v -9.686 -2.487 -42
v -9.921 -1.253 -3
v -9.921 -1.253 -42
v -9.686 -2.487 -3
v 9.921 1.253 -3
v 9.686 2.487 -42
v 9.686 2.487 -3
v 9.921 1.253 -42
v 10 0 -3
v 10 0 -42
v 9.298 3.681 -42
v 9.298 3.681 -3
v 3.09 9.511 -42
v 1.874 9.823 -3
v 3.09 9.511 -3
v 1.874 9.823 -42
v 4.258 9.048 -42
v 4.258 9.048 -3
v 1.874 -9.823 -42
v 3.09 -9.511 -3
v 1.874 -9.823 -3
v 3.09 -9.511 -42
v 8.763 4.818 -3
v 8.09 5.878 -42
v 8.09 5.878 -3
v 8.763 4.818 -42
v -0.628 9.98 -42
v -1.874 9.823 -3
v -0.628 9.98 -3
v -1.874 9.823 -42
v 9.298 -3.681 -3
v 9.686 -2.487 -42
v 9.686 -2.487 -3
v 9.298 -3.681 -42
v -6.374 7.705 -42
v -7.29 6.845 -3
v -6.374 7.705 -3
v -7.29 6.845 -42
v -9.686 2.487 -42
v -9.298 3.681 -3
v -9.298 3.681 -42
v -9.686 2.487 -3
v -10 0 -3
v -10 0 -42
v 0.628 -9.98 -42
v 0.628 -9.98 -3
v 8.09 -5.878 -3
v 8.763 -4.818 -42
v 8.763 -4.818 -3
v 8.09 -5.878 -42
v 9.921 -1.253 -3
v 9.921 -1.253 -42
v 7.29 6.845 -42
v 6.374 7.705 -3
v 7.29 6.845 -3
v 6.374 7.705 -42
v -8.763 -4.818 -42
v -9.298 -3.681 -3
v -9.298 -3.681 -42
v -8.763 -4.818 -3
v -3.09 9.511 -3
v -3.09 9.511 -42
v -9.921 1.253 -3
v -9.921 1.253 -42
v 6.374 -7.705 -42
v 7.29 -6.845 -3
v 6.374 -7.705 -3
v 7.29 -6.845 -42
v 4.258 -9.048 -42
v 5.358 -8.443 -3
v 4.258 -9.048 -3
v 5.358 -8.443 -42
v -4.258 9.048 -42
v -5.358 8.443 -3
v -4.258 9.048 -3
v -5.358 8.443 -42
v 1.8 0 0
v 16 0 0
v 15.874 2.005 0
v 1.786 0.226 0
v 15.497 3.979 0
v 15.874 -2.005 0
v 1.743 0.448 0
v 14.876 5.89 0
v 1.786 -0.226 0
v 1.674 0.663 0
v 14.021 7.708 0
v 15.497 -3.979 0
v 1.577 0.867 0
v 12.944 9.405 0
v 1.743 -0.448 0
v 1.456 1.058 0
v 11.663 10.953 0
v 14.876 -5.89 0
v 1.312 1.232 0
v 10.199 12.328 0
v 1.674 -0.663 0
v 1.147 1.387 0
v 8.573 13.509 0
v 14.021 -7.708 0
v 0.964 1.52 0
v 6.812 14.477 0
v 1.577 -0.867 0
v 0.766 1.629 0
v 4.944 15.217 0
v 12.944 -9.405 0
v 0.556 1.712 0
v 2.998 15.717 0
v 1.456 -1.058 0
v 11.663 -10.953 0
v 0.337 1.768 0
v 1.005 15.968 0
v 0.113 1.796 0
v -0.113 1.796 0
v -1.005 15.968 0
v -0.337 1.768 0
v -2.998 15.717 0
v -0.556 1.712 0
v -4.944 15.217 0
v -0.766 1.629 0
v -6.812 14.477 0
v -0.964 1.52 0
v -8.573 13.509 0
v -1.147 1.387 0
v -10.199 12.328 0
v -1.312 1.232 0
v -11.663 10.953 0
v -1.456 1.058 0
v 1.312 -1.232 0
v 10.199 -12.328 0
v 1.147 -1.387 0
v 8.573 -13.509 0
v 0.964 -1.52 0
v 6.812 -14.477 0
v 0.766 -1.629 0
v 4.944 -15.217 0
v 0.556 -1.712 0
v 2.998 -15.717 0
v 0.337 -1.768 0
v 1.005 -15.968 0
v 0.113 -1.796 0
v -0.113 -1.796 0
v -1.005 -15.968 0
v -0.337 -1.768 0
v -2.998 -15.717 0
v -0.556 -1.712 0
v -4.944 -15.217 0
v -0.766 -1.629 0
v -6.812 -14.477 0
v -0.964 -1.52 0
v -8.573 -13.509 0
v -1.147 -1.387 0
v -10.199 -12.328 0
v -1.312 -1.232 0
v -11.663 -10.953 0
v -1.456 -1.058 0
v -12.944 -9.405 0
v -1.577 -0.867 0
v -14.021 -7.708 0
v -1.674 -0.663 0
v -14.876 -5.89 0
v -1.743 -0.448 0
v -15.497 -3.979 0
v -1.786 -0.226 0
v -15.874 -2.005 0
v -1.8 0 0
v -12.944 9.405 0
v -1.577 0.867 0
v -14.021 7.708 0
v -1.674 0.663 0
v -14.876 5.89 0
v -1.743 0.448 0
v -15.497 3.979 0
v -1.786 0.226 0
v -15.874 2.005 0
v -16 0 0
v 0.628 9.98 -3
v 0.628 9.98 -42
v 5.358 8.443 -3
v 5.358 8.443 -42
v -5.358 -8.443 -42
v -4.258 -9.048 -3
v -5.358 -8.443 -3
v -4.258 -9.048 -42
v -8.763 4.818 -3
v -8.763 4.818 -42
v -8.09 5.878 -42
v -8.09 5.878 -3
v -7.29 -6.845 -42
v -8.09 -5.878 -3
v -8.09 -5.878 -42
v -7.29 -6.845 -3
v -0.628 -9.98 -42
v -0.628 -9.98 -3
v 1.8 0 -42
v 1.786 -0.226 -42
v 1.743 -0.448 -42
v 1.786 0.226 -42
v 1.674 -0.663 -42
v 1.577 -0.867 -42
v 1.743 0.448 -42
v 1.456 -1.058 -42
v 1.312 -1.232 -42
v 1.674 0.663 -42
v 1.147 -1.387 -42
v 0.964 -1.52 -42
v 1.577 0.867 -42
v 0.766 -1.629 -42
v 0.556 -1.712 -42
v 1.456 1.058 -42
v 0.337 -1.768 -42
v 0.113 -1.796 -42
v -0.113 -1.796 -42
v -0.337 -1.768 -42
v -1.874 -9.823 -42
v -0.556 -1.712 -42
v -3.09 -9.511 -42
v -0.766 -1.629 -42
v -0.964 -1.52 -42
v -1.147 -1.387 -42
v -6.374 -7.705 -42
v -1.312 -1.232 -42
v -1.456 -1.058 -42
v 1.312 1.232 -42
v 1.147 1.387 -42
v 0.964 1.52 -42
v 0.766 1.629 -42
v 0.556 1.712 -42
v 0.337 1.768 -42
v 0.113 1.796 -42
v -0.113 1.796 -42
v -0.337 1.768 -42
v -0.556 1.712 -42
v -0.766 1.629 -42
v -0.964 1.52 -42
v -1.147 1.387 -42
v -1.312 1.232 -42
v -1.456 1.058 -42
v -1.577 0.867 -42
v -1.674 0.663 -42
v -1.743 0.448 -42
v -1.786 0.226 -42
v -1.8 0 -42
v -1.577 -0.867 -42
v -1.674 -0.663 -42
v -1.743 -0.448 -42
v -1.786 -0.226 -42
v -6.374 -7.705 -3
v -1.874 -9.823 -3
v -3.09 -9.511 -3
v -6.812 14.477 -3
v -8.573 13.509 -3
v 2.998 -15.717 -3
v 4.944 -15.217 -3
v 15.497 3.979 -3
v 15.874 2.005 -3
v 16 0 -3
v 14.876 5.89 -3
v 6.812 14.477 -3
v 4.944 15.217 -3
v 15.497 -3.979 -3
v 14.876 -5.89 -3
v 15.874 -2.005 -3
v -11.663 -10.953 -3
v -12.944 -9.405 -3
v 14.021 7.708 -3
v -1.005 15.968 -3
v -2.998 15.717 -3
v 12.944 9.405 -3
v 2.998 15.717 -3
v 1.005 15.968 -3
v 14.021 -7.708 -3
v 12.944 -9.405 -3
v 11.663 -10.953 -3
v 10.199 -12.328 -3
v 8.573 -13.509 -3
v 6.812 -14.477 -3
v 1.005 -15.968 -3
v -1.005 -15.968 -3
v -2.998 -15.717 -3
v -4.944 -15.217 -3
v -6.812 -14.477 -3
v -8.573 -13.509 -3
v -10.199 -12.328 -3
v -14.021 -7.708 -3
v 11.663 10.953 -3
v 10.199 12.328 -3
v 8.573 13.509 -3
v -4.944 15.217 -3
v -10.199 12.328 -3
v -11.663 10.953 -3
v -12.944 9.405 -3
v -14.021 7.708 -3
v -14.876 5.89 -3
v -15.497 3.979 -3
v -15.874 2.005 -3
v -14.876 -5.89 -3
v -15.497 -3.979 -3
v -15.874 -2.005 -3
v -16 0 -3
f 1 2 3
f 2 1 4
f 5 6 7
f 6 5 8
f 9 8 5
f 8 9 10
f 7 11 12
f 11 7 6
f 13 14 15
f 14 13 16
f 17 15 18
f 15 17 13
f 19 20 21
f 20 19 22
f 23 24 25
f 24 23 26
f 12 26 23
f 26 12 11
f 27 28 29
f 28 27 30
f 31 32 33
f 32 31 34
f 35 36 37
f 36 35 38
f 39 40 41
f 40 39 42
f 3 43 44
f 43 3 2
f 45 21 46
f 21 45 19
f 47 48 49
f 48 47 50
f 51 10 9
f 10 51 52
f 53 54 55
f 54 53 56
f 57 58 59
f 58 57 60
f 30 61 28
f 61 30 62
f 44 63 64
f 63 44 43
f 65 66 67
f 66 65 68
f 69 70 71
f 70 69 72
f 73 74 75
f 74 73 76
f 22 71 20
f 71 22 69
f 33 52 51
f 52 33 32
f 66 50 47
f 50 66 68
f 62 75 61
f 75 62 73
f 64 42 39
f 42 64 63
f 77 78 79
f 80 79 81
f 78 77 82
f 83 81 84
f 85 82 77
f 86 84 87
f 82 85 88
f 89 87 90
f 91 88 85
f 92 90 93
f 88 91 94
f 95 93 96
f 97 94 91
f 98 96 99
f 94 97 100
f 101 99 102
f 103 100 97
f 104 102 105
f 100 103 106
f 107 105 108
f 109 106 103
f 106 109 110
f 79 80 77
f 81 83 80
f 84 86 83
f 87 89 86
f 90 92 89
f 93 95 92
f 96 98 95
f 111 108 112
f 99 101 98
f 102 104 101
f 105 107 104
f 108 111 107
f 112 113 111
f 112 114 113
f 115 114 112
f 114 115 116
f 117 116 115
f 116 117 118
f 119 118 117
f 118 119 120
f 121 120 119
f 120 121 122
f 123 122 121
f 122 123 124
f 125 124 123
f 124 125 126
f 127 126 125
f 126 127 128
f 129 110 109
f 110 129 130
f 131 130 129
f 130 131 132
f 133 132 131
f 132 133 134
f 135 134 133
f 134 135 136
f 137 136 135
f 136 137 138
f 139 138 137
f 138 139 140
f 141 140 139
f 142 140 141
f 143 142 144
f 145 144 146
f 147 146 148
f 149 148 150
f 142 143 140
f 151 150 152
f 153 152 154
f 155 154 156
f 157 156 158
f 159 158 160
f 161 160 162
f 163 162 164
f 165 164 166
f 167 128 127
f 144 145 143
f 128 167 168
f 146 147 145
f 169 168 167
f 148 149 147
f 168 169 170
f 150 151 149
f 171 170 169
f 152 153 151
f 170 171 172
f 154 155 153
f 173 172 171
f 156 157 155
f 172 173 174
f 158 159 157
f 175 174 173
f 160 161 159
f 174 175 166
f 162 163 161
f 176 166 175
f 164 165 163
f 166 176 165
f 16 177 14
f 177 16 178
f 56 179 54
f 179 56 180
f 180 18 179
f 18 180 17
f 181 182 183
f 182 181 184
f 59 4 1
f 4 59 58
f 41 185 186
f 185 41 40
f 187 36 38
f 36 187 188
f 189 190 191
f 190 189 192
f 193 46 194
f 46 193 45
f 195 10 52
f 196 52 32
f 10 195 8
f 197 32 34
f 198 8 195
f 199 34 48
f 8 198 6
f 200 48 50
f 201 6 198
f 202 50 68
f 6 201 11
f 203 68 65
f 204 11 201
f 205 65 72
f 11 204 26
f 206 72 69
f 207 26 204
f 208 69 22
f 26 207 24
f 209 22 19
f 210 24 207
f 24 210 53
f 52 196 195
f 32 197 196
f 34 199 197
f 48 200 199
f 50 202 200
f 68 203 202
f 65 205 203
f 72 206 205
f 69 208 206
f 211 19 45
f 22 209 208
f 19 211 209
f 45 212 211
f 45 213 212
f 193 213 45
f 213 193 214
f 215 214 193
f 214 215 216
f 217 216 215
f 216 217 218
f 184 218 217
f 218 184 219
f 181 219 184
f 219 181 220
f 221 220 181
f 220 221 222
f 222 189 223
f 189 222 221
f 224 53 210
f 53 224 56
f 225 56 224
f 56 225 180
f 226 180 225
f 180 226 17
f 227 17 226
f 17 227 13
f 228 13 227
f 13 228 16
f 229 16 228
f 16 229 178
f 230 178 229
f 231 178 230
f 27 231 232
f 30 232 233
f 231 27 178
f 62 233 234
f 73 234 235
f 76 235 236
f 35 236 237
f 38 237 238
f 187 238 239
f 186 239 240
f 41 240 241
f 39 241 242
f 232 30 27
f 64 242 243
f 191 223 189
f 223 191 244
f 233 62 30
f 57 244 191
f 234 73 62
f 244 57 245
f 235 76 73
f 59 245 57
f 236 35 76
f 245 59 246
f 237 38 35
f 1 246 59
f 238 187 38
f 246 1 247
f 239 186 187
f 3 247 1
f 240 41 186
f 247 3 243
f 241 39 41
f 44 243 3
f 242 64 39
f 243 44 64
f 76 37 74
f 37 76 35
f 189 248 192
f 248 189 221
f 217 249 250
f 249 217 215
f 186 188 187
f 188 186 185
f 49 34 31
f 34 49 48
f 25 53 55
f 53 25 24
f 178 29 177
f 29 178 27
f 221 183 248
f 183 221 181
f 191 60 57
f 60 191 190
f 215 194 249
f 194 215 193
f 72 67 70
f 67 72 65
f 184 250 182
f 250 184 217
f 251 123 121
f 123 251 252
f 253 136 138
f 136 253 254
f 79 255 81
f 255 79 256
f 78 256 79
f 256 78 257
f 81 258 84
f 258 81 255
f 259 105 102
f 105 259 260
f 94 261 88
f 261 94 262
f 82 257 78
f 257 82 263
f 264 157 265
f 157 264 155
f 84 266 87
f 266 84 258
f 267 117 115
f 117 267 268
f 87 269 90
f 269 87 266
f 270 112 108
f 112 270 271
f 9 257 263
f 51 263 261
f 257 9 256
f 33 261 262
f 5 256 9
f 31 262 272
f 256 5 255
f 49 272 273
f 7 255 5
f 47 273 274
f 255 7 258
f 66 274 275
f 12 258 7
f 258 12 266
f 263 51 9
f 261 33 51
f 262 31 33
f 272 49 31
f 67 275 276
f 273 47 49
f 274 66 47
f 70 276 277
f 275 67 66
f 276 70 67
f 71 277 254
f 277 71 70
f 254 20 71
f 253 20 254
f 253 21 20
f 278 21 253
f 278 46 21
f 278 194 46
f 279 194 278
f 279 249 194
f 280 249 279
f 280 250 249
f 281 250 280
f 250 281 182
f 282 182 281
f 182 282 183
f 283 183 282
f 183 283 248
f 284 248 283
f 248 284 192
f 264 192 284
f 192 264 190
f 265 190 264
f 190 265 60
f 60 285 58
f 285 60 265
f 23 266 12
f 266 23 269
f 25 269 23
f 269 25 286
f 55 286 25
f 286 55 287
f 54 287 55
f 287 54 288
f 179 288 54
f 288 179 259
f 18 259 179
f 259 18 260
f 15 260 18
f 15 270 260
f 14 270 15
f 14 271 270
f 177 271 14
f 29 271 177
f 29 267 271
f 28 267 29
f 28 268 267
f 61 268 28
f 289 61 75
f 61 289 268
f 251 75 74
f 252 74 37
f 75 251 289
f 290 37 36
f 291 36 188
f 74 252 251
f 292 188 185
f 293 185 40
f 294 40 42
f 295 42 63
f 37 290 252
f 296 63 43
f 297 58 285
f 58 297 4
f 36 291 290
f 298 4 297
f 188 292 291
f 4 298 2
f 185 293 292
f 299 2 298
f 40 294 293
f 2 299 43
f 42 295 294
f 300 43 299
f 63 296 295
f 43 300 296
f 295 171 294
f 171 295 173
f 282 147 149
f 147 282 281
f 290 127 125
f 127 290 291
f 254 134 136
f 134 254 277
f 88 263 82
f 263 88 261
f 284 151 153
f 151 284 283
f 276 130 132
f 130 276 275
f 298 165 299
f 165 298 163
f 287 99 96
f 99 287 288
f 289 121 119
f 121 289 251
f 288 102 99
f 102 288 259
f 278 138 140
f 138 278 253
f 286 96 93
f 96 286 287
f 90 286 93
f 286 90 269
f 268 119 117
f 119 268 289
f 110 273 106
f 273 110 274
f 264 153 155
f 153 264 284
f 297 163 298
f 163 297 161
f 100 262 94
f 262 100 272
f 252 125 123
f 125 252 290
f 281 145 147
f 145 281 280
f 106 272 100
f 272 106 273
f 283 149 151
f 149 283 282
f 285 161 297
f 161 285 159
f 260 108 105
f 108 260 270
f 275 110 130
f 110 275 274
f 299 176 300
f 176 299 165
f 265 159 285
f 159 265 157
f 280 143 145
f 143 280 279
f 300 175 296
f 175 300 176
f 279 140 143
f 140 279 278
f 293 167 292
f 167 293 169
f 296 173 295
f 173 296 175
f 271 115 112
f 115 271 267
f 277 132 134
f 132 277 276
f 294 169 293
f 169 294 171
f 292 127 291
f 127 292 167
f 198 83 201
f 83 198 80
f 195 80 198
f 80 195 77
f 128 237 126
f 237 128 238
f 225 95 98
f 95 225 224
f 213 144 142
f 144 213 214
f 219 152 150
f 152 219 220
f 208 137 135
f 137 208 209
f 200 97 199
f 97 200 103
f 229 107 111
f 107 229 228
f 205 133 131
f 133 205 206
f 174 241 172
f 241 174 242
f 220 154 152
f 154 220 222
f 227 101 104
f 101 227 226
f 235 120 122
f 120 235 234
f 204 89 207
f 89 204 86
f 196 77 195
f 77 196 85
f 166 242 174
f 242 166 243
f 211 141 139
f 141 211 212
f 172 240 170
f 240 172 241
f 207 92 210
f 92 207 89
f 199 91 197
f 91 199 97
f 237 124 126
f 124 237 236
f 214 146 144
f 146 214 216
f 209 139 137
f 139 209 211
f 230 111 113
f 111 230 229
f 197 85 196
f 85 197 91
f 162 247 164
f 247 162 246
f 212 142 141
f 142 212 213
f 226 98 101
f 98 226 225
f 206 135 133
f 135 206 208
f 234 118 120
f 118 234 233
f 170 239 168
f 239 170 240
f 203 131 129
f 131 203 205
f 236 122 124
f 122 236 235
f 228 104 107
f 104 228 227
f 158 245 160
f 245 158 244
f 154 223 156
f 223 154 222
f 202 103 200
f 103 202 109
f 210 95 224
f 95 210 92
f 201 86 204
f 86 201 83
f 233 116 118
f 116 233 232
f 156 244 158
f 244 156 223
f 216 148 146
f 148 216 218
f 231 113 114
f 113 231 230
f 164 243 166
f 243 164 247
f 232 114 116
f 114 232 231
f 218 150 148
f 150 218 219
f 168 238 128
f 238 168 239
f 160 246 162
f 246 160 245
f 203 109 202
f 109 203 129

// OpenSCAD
$fn = 50;


difference() {
	union() {
		translate(v = [0, 0, -42.0000000000]) {
			cylinder(h = 42, r = 10.0000000000);
		}
		translate(v = [0, 0, -3.0000000000]) {
			cylinder(h = 3, r = 16.0000000000);
		}
	}
	union() {
		#translate(v = [0, 0, -42]) {
			cylinder(h = 42, r = 1.8000000000);
		}
	}
}
